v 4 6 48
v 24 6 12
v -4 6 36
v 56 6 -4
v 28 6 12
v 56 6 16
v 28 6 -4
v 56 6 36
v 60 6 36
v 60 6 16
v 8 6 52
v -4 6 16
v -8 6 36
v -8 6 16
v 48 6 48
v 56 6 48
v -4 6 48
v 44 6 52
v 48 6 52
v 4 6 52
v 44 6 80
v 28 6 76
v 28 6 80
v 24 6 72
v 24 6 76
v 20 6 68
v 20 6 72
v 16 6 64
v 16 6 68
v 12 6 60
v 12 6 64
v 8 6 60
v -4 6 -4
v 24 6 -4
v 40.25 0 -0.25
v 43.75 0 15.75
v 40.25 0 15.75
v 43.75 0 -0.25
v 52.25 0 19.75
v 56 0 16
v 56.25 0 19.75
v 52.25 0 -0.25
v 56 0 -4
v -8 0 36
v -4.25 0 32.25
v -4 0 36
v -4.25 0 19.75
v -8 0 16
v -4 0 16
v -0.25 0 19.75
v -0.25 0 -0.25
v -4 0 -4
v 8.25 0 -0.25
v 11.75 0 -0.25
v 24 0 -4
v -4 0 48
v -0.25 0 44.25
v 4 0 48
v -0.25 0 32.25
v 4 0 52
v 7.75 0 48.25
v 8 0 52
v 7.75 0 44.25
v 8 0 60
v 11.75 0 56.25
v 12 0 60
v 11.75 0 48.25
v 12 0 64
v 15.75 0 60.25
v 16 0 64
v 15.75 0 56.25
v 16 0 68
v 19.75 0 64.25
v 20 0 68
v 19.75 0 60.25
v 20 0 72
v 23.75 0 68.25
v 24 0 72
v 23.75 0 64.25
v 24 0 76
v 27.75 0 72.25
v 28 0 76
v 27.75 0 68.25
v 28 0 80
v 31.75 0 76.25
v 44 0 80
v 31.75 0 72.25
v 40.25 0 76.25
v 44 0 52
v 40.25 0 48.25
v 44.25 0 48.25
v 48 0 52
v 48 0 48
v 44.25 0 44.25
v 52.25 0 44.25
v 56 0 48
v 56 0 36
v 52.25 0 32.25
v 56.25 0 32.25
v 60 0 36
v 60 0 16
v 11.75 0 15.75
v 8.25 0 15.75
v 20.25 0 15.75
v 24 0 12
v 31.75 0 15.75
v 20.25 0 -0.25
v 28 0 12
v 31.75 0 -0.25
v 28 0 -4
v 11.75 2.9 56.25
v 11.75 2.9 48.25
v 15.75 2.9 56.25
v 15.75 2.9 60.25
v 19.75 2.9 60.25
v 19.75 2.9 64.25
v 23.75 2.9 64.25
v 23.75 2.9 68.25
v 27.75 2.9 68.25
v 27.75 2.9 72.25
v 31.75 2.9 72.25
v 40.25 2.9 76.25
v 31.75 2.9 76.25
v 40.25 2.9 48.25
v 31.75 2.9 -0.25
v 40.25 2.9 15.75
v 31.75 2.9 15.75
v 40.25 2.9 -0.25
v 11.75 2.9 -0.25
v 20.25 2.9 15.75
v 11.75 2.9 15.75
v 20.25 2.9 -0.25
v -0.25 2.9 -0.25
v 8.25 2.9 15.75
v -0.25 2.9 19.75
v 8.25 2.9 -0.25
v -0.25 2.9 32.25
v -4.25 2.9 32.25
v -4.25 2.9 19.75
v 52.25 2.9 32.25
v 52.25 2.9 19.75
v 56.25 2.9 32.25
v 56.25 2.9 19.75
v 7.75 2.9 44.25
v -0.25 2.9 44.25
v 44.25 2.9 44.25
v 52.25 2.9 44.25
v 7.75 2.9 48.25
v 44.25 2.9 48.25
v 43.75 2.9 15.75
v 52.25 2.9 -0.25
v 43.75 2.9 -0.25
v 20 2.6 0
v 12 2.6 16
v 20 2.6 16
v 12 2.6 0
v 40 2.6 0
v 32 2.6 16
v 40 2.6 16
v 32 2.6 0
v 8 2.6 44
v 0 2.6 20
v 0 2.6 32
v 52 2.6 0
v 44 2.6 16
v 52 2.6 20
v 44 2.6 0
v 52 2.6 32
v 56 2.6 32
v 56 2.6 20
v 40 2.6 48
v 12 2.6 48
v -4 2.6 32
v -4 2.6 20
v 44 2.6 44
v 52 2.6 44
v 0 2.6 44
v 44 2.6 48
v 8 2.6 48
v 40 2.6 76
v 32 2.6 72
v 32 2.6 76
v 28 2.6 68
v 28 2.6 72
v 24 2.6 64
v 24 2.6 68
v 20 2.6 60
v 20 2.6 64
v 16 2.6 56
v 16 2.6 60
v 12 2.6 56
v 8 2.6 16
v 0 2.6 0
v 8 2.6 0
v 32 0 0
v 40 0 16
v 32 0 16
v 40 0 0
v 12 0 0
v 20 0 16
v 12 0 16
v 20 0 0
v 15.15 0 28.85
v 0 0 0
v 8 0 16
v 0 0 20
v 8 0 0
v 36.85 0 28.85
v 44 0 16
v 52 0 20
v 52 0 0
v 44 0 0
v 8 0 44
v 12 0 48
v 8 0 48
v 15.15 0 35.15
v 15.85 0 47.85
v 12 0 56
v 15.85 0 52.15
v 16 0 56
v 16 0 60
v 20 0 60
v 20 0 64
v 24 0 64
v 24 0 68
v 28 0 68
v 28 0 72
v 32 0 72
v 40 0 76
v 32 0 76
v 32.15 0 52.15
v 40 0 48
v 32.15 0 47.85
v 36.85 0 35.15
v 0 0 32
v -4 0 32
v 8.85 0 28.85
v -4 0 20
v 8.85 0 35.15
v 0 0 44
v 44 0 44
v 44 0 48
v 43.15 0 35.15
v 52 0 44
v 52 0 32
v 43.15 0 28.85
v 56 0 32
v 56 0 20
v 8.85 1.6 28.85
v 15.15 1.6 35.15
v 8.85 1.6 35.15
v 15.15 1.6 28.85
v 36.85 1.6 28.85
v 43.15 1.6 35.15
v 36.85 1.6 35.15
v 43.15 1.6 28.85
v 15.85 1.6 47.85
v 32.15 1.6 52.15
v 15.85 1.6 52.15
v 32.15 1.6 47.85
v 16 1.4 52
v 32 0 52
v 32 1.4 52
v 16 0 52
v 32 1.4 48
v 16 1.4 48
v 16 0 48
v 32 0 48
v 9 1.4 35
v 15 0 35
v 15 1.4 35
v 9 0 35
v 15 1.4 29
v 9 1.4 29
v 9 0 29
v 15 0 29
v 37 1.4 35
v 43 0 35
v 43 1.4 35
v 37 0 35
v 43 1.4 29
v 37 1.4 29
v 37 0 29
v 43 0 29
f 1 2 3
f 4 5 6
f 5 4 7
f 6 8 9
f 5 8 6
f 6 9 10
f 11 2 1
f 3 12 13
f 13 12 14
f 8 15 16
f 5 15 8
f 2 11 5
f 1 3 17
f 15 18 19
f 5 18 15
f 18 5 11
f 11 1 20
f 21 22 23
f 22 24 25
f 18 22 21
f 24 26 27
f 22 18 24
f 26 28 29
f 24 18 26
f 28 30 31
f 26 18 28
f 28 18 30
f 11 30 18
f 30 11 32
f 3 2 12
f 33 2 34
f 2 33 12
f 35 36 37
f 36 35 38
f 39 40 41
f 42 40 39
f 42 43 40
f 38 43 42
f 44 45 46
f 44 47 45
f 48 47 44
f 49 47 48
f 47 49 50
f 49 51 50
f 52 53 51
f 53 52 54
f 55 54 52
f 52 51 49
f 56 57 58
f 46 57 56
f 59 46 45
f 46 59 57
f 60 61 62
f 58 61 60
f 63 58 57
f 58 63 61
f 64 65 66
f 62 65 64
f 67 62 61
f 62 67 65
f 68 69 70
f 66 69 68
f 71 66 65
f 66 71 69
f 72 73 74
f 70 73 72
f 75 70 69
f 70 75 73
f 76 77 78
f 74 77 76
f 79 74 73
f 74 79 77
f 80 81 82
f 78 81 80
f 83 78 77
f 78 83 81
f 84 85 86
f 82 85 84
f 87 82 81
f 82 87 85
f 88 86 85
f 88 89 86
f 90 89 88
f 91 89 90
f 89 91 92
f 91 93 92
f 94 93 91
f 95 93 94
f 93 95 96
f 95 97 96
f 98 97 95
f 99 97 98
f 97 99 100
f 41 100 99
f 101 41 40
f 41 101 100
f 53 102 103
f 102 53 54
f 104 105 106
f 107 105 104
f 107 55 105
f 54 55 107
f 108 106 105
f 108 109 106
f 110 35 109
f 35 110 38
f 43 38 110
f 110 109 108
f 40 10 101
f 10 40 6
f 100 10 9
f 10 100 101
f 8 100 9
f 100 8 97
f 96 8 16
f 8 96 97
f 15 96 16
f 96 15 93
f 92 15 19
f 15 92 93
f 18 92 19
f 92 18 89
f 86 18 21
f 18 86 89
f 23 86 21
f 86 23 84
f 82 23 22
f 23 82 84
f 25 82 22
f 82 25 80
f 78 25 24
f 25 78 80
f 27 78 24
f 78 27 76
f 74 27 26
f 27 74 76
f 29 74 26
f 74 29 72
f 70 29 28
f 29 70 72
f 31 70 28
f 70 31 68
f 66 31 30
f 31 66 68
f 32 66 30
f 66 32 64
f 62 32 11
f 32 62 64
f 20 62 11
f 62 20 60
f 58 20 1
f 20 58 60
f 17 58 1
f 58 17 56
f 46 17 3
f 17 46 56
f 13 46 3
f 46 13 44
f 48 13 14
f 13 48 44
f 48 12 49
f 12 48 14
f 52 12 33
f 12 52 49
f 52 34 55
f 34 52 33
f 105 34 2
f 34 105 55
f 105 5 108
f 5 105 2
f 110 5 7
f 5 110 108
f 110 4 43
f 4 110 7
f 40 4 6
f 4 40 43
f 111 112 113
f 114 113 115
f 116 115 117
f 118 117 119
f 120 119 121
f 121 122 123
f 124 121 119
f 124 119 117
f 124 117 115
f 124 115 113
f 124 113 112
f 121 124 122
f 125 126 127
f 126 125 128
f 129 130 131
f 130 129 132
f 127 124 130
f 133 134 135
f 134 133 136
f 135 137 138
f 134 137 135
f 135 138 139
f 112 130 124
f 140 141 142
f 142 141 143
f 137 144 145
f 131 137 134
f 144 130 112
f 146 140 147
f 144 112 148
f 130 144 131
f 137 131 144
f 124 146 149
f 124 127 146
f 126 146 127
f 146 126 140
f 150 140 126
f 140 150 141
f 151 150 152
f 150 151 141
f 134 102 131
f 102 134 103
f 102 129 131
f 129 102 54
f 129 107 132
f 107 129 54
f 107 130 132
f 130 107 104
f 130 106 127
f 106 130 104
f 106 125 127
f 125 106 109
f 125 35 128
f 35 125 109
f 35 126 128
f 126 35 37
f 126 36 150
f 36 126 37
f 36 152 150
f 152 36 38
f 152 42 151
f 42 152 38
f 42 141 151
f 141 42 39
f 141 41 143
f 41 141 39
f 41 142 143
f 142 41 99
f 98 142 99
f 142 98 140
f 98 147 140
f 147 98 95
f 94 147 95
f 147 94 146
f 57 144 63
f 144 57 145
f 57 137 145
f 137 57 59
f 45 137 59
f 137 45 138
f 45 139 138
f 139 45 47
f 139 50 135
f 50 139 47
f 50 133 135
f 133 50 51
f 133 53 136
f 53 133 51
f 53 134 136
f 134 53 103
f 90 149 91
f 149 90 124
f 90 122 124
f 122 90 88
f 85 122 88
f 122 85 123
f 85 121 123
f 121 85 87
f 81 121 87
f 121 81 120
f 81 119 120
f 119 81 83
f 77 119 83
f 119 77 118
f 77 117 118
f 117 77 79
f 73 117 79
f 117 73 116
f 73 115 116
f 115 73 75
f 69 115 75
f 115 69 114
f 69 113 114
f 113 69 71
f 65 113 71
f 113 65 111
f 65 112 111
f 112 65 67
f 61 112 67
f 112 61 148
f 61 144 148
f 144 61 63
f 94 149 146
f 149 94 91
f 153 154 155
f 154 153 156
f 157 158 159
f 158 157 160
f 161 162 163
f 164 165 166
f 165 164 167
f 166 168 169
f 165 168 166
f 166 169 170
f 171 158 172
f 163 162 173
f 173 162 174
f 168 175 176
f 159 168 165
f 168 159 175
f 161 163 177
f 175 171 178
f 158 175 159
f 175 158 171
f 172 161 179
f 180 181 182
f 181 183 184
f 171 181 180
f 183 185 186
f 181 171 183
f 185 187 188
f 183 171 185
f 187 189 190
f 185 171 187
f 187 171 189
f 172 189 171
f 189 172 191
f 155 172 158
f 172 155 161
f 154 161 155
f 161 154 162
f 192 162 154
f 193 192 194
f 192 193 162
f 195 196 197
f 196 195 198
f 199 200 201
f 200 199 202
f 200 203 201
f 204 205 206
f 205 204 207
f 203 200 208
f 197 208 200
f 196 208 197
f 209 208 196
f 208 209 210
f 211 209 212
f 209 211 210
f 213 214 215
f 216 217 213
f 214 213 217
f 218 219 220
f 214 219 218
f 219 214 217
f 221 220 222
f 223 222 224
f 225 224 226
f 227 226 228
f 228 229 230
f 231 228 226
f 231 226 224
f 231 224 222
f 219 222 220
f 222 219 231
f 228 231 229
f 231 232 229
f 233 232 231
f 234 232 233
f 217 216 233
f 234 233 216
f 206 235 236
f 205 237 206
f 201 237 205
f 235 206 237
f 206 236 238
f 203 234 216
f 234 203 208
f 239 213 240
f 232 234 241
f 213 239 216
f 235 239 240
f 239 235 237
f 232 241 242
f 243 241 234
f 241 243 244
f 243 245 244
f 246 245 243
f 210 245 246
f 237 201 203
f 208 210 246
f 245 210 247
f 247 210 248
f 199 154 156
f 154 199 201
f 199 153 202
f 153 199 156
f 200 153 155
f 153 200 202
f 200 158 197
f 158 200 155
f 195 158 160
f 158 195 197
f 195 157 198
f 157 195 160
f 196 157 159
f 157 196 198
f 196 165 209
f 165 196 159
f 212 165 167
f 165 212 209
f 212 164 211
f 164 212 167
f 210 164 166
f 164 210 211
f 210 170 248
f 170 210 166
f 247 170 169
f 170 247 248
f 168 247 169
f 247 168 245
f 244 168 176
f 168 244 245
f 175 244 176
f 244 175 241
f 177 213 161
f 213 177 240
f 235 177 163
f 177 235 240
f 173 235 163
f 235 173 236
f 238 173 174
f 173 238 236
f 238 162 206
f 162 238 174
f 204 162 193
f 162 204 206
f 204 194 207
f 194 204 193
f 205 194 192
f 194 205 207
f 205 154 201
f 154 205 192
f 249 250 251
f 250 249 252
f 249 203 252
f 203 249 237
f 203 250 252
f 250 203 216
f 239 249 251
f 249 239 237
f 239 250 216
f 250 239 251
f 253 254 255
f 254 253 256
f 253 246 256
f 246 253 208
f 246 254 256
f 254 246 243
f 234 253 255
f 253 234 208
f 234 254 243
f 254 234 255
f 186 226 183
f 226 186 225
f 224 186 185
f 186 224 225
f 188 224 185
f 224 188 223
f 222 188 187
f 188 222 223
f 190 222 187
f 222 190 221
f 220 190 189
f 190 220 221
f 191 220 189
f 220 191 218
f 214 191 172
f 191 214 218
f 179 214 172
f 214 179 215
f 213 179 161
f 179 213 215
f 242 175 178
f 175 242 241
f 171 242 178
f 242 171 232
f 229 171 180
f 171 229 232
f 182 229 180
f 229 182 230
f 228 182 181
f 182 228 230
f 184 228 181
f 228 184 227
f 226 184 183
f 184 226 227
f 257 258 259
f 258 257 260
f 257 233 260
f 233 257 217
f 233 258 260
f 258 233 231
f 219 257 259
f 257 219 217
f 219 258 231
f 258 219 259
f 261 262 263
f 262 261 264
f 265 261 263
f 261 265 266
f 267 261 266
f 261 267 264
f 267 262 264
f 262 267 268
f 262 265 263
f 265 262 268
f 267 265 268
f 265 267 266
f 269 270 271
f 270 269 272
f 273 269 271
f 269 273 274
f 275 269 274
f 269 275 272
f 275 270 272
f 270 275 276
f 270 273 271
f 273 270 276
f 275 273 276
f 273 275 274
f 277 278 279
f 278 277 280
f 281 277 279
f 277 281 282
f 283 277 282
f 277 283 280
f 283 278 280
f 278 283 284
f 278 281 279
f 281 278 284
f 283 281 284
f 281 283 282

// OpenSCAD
// Clawd - Version 006
// Generated from reference image: references/01_clawd.png
// Changes from version 005:
// - Widened the main body silhouette slightly and deepened the center leg cutout.
// - Reduced the wizard hat footprint so it reads as an accessory instead of the main subject.
// - Kept the white frame + colored inlay assembly strategy unchanged.

display_mode = "assembly"; // ["assembly", "layout", "base", "body", "hat", "band", "left_eye", "right_eye"]

pixel = 4;
eps = 0.01;
$fn = 32;

// Assembly depths
base_depth = 6.0;
inlay_depth = 2.6;
detail_depth = 1.4;
base_pocket_depth = 2.9;
detail_pocket_depth = 1.6;

// Print clearances
body_clearance = 0.25;
detail_clearance = 0.15;
outline = 1 * pixel;
layout_gap = 10;

// Body proportions tuned from the 004 feedback:
// taller stance, longer legs, and lighter side protrusions.
body_w = 13 * pixel;
body_h = 11 * pixel;
hand_w = 1 * pixel;
hand_h = 3 * pixel;
hand_z = 5 * pixel;

leg_h = 4 * pixel;
outer_leg_w = 2 * pixel;
inner_leg_w = 2 * pixel;
outer_gap = 1 * pixel;
center_gap = 3 * pixel;

// Eyes remain simple square inserts to stay close to the reference.
eye_size = 1.5 * pixel;
eye_from_side = 3 * pixel;
eye_from_top = 3 * pixel;
eye_left_x = eye_from_side - eye_size / 2;
eye_bottom_z = body_h - eye_from_top - eye_size / 2;

// Render colors
frame_color = [0.97, 0.97, 0.97];
body_color = [0.86, 0.48, 0.35];
hat_color = [0.17, 0.27, 0.66];
band_color = [0.94, 0.76, 0.20];
eye_color = [0.03, 0.03, 0.03];

module extrude_front(depth) {
    translate([0, depth, 0])
        rotate([90, 0, 0])
            linear_extrude(height = depth)
                children();
}

module front_pocket(depth) {
    translate([0, -eps, 0])
        extrude_front(depth + eps)
            children();
}

module top_pocket(total_depth, pocket_depth) {
    translate([0, 0, total_depth - pocket_depth - eps])
        linear_extrude(height = pocket_depth + 2 * eps)
            children();
}

module orange_body_2d() {
    difference() {
        union() {
            square([body_w, body_h]);

            translate([-hand_w, hand_z])
                square([hand_w, hand_h]);

            translate([body_w, hand_z])
                square([hand_w, hand_h]);
        }

        translate([outer_leg_w, 0])
            square([outer_gap, leg_h]);

        translate([outer_leg_w + outer_gap + inner_leg_w, 0])
            square([center_gap, leg_h]);

        translate([body_w - outer_leg_w - outer_gap, 0])
            square([outer_gap, leg_h]);
    }
}

module left_eye_2d() {
    translate([eye_left_x, eye_bottom_z])
        square([eye_size, eye_size]);
}

module right_eye_2d() {
    translate([body_w - eye_left_x - eye_size, eye_bottom_z])
        square([eye_size, eye_size]);
}

module wizard_hat_2d() {
    union() {
        translate([3 * pixel, body_h + 2 * pixel])
            square([7 * pixel, 1 * pixel]);
        translate([2 * pixel, body_h])
            square([9 * pixel, 1 * pixel]);
        translate([3 * pixel, body_h + 1 * pixel])
            square([7 * pixel, 1 * pixel]);
        translate([4 * pixel, body_h + 3 * pixel])
            square([6 * pixel, 1 * pixel]);
        translate([5 * pixel, body_h + 4 * pixel])
            square([5 * pixel, 1 * pixel]);
        translate([6 * pixel, body_h + 5 * pixel])
            square([4 * pixel, 1 * pixel]);
        translate([7 * pixel, body_h + 6 * pixel])
            square([3 * pixel, 1 * pixel]);
        translate([8 * pixel, body_h + 7 * pixel])
            square([2 * pixel, 1 * pixel]);
    }
}

module hat_band_2d() {
    translate([4 * pixel, body_h + 1 * pixel])
        square([4 * pixel, 1 * pixel]);
}

module assembled_outline_2d() {
    union() {
        orange_body_2d();
        wizard_hat_2d();
    }
}

module outer_frame_2d() {
    offset(delta = outline)
        assembled_outline_2d();
}

module base_plate(flat = false) {
    color(frame_color)
        difference() {
            if (flat)
                linear_extrude(height = base_depth)
                    outer_frame_2d();
            else
                extrude_front(base_depth)
                    outer_frame_2d();

            if (flat)
                top_pocket(base_depth, base_pocket_depth)
                    offset(delta = body_clearance)
                        orange_body_2d();
            else
                front_pocket(base_pocket_depth)
                    offset(delta = body_clearance)
                        orange_body_2d();

            if (flat)
                top_pocket(base_depth, base_pocket_depth)
                    offset(delta = body_clearance)
                        wizard_hat_2d();
            else
                front_pocket(base_pocket_depth)
                    offset(delta = body_clearance)
                        wizard_hat_2d();
        }
}

module body_piece(flat = false) {
    color(body_color)
        difference() {
            if (flat)
                linear_extrude(height = inlay_depth)
                    orange_body_2d();
            else
                extrude_front(inlay_depth)
                    orange_body_2d();

            if (flat)
                top_pocket(inlay_depth, detail_pocket_depth)
                    offset(delta = detail_clearance)
                        left_eye_2d();
            else
                front_pocket(detail_pocket_depth)
                    offset(delta = detail_clearance)
                        left_eye_2d();

            if (flat)
                top_pocket(inlay_depth, detail_pocket_depth)
                    offset(delta = detail_clearance)
                        right_eye_2d();
            else
                front_pocket(detail_pocket_depth)
                    offset(delta = detail_clearance)
                        right_eye_2d();
        }
}

module hat_piece(flat = false) {
    color(hat_color)
        difference() {
            if (flat)
                linear_extrude(height = inlay_depth)
                    wizard_hat_2d();
            else
                extrude_front(inlay_depth)
                    wizard_hat_2d();

            if (flat)
                top_pocket(inlay_depth, detail_pocket_depth)
                    offset(delta = detail_clearance)
                        hat_band_2d();
            else
                front_pocket(detail_pocket_depth)
                    offset(delta = detail_clearance)
                        hat_band_2d();
        }
}

module band_piece(flat = false) {
    color(band_color)
        if (flat)
            linear_extrude(height = detail_depth)
                hat_band_2d();
        else
            extrude_front(detail_depth)
                hat_band_2d();
}

module left_eye_piece(flat = false) {
    color(eye_color)
        if (flat)
            linear_extrude(height = detail_depth)
                left_eye_2d();
        else
            extrude_front(detail_depth)
                left_eye_2d();
}

module right_eye_piece(flat = false) {
    color(eye_color)
        if (flat)
            linear_extrude(height = detail_depth)
                right_eye_2d();
        else
            extrude_front(detail_depth)
                right_eye_2d();
}

module assembly_view() {
    base_plate();
    body_piece();
    hat_piece();
    band_piece();
    left_eye_piece();
    right_eye_piece();
}

module print_layout() {
    base_plate(true);

    translate([76, 0, 0])
        body_piece(true);

    translate([138, 0, 0])
        hat_piece(true);

    translate([138, 52, 0])
        band_piece(true);

    translate([200, 0, 0])
        left_eye_piece(true);

    translate([214, 0, 0])
        right_eye_piece(true);
}

if (display_mode == "assembly") {
    assembly_view();
} else if (display_mode == "layout") {
    print_layout();
} else if (display_mode == "base") {
    base_plate(true);
} else if (display_mode == "body") {
    body_piece(true);
} else if (display_mode == "hat") {
    hat_piece(true);
} else if (display_mode == "band") {
    band_piece(true);
} else if (display_mode == "left_eye") {
    left_eye_piece(true);
} else if (display_mode == "right_eye") {
    right_eye_piece(true);
} else {
    assembly_view();
}
